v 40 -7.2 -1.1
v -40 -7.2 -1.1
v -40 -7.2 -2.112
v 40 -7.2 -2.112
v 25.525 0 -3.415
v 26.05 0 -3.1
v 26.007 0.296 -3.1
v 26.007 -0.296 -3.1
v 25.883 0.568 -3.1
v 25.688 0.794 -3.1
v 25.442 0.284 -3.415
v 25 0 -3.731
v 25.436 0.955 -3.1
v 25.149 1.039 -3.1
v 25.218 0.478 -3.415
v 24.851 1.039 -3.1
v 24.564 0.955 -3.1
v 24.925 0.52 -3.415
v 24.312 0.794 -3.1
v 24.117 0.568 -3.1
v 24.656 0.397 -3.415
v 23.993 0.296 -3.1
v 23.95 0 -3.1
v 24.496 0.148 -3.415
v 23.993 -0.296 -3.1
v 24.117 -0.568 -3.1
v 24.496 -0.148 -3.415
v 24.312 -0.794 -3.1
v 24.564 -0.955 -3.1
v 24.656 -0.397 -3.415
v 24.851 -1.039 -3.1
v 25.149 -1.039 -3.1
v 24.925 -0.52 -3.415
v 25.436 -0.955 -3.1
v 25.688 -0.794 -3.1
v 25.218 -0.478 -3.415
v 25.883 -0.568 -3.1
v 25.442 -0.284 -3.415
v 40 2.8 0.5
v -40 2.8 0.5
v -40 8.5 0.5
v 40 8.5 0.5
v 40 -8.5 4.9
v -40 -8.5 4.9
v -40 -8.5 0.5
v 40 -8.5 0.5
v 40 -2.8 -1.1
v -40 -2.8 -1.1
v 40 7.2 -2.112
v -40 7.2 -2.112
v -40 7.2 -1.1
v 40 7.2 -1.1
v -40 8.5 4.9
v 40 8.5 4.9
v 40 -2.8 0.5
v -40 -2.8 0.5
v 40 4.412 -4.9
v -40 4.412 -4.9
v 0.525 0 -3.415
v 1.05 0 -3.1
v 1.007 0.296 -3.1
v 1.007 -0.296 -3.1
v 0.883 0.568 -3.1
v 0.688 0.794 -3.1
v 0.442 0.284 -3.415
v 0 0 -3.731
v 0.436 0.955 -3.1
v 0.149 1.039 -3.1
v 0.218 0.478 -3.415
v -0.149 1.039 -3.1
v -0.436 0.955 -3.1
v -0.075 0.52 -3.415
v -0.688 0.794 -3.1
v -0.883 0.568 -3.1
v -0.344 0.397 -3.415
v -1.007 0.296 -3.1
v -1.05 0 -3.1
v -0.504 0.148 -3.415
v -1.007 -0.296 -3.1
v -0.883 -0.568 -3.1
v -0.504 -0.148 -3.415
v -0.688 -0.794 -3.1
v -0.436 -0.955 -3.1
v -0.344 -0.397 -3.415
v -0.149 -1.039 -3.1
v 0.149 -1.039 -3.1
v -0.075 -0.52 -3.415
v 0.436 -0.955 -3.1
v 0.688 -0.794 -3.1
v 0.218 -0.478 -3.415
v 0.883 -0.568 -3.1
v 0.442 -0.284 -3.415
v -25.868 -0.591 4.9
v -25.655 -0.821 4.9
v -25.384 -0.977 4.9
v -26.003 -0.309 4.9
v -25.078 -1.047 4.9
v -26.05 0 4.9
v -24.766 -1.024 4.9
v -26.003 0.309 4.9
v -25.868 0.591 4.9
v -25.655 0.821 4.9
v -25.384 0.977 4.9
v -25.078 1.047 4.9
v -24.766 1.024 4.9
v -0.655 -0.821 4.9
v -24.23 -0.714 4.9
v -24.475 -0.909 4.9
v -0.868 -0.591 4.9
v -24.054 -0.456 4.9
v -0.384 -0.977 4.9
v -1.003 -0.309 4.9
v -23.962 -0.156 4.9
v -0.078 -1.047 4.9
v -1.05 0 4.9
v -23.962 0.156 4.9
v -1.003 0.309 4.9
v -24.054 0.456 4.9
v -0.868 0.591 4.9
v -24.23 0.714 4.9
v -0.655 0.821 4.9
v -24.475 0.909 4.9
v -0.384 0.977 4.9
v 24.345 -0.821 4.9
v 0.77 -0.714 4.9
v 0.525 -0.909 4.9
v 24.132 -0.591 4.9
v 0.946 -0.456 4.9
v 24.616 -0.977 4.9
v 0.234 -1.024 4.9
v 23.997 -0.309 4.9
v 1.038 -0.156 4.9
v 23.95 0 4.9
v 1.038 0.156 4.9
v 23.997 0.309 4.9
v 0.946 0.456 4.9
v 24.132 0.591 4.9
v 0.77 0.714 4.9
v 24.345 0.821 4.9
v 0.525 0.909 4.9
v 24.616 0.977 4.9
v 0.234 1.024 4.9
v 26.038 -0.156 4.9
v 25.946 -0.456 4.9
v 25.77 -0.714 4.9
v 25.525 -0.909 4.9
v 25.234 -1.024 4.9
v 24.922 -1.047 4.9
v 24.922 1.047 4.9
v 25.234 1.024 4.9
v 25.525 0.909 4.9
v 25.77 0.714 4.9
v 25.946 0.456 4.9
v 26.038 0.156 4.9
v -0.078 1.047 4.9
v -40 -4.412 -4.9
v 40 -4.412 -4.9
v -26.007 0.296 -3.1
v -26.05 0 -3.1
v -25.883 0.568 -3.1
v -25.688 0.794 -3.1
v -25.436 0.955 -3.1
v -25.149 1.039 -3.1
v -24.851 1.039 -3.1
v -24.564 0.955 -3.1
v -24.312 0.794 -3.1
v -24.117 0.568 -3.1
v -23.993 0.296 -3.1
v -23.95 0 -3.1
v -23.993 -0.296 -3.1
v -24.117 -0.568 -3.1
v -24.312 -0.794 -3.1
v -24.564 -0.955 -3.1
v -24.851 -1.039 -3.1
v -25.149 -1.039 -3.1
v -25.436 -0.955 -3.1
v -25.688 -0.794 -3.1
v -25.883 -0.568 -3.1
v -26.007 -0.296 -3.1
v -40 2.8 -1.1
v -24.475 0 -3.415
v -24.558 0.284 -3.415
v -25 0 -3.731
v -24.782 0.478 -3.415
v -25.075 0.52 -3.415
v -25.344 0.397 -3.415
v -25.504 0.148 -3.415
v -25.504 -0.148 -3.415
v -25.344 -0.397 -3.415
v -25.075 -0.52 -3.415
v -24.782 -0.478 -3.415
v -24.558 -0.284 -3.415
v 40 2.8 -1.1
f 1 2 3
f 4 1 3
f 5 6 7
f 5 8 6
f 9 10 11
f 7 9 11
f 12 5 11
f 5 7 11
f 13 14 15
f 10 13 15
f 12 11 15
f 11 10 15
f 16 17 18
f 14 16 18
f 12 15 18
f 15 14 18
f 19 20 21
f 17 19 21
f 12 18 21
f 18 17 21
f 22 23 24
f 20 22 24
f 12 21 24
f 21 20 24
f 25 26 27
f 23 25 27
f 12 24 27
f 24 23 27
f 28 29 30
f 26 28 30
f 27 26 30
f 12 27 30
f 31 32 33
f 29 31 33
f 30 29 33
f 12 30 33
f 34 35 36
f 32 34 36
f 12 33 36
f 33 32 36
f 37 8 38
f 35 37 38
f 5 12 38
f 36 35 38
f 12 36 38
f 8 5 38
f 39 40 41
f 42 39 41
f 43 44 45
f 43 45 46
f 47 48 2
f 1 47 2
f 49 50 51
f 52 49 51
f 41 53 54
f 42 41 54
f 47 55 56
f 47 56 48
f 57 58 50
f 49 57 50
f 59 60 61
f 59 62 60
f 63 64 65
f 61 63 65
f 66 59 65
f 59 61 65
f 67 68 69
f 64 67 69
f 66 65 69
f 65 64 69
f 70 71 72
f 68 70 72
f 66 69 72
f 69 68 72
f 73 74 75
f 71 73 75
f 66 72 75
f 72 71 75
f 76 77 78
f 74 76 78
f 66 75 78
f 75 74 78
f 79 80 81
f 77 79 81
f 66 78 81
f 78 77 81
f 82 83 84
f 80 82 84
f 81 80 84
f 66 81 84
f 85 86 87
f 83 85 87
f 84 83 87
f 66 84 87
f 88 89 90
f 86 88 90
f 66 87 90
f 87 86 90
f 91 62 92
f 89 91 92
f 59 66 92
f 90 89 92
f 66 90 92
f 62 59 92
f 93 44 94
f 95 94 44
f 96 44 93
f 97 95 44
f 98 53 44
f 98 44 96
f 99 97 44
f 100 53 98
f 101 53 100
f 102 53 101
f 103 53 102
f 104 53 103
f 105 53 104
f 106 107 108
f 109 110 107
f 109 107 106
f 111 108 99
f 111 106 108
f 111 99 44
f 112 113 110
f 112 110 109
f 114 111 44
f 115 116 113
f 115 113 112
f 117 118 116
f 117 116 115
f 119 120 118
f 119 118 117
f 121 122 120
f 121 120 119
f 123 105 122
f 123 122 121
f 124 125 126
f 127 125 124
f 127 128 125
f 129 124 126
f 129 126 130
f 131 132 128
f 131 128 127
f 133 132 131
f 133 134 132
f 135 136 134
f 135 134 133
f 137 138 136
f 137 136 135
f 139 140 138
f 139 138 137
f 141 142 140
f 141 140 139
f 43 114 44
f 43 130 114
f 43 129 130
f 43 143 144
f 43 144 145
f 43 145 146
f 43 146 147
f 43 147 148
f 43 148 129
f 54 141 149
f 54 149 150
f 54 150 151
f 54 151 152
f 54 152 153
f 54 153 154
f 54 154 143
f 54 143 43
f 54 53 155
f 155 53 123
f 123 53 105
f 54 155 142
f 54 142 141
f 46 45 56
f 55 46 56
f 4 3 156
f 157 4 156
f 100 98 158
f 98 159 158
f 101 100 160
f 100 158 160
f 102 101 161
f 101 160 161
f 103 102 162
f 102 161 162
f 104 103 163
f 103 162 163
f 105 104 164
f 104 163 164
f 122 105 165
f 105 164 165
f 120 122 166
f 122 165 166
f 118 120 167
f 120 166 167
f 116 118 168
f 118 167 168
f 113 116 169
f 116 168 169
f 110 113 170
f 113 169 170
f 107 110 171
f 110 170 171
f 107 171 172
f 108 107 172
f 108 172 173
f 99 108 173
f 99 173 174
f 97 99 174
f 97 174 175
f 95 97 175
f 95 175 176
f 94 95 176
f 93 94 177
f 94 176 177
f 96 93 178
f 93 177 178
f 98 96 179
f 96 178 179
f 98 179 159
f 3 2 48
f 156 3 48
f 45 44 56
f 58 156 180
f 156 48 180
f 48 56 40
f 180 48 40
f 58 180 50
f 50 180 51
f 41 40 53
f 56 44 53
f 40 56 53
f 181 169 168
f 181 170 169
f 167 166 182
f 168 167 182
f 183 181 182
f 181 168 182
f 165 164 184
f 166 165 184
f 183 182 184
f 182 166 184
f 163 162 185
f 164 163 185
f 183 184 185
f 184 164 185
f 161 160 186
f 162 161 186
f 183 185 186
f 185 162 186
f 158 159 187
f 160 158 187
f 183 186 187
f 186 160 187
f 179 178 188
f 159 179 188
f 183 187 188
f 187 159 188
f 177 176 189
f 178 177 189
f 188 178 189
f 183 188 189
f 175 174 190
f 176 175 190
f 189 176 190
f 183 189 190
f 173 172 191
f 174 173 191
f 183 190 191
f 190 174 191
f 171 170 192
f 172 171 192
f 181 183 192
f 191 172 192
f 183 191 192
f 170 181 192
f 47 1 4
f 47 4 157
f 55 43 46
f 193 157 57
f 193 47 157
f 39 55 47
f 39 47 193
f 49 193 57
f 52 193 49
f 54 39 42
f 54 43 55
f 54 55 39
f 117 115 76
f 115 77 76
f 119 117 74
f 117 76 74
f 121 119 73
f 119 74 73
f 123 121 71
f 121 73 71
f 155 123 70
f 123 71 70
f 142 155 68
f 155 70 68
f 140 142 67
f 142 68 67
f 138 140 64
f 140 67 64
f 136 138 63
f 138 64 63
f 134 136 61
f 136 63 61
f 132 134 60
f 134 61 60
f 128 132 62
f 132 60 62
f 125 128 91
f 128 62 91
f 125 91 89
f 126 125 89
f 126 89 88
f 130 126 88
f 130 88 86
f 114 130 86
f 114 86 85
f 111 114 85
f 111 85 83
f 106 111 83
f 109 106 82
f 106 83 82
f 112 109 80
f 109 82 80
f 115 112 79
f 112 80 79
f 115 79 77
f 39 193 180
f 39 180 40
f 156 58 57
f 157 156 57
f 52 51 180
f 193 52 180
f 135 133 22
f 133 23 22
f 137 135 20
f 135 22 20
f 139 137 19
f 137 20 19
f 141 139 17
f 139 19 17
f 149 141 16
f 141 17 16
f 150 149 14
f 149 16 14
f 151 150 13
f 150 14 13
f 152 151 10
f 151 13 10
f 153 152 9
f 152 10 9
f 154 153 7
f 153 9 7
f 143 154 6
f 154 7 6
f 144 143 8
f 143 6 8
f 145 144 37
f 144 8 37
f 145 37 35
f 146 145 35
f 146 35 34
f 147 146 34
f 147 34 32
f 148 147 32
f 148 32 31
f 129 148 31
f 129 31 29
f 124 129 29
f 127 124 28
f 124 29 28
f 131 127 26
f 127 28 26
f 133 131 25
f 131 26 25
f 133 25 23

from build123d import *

# Parameters (mm, degrees)
F0_W     = 80
F0_H     = 17
F1_DEPTH = 4.9
F3_DEPTH = 80.001
F5_D     = 2.1
F5_DEPTH = 8
F5_TIP   = 0.63090365


with BuildPart() as f1:
    # F0 (on Top) → F1 (new body, symmetric)
    with BuildSketch(Plane.XY):
        Rectangle(F0_W, F0_H)
    extrude(amount=F1_DEPTH, both=True)

    # F2 (on face) → F3 (cut, through all)
    with BuildSketch(Plane(origin=(-40, 0, 0), x_dir=(0, -1, 0), z_dir=(-1, 0, 0))):
        Polygon((-2.8, 0.5), (-8.5, 0.5), (-8.5, -4.9), (-4.411739485, -4.9), (-7.2, -2.111739485), (-7.2, -1.1), (-2.8, -1.1), align=None)
        Polygon((8.5, 0.5), (2.8, 0.5), (2.8, -1.1), (7.2, -1.1), (7.2, -2.111739485), (4.411739485, -4.9), (8.5, -4.9), align=None)
    extrude(amount=-F3_DEPTH, mode=Mode.SUBTRACT)

    # F5
    with Locations(Plane.XY.offset(4.9)):
        with Locations((-25, 0), (25, 0), (0, 0)):
            Hole(F5_D / 2, depth=F5_DEPTH)
            with Locations((0, 0, -(F5_DEPTH + F5_TIP / 2))):  # 118° drill point
                Cone(0, F5_D / 2, F5_TIP, mode=Mode.SUBTRACT)


solid = f1.part
